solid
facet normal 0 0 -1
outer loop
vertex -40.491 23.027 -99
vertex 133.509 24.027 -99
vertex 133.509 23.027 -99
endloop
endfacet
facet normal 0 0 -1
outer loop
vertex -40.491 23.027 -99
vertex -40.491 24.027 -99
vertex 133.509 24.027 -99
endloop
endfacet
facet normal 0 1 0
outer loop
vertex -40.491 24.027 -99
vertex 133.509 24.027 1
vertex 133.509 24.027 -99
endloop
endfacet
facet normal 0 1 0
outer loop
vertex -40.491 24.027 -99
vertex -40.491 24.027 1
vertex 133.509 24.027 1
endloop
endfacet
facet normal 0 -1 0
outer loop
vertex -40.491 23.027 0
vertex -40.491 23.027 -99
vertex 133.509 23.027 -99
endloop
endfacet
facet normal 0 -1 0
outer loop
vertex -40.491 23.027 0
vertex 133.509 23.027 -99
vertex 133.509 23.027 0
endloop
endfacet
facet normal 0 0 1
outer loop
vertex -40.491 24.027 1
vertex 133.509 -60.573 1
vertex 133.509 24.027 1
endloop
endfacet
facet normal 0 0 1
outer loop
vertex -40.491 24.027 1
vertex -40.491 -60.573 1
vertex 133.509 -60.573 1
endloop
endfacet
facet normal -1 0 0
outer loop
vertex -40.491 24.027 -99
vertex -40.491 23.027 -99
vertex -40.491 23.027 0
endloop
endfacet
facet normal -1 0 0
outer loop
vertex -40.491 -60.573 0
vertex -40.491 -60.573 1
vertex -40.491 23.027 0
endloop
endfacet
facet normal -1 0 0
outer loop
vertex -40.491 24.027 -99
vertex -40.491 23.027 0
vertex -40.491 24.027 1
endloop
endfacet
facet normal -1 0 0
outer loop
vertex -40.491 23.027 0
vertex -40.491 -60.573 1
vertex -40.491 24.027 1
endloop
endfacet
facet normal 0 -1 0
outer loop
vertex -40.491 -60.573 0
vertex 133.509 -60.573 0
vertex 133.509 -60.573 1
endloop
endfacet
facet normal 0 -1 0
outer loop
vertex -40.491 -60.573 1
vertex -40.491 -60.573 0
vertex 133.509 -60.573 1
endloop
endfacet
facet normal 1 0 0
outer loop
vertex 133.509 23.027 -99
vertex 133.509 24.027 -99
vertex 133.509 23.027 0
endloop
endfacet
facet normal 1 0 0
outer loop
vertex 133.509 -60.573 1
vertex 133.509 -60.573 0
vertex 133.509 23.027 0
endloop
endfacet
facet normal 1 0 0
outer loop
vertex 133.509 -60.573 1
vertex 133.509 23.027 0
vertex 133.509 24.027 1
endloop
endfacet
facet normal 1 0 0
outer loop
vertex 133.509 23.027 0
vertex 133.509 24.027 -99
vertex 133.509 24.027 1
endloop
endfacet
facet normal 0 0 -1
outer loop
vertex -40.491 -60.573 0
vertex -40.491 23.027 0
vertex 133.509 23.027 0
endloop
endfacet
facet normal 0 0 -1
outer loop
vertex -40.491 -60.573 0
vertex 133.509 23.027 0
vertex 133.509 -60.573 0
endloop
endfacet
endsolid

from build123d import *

# Parameters (mm, degrees)
ESQUISSE1_W        = 58
ESQUISSE1_H        = 84.6
BOSS_EXTRU_1_DEPTH = 1
ESQUISSE2_W        = 58
ESQUISSE2_H        = 1
BOSS_EXTRU_2_DEPTH = 99
BOSS_EXTRU_3_DEPTH = 116


with BuildPart() as part:
    # Esquisse1 → Boss.-Extru.1 (new body)
    with BuildSketch(Plane.XY):
        with Locations((-11.490537589, -18.273098988)):
            Rectangle(ESQUISSE1_W, ESQUISSE1_H)
    extrude(amount=BOSS_EXTRU_1_DEPTH)

    # Esquisse2 → Boss.-Extru.2 (add)
    with BuildSketch(Plane(origin=(0, 0, 0), x_dir=(-1, 0, 0), z_dir=(0, 0, -1))):
        with Locations((11.490537589, 23.526901012)):
            Rectangle(ESQUISSE2_W, ESQUISSE2_H)
    extrude(amount=BOSS_EXTRU_2_DEPTH)

    # Esquisse3 → Boss.-Extru.3 (add)
    with BuildSketch(Plane(origin=(17.509462411, 0, 0), x_dir=(0, 0, -1), z_dir=(1, 0, 0))):
        Polygon((99, 24.026901012), (99, 23.026901012), (0, 23.026901012), (0, -60.573098988), (-1, -60.573098988), (-1, 24.026901012), align=None)
    extrude(amount=BOSS_EXTRU_3_DEPTH)


solid = part.part
